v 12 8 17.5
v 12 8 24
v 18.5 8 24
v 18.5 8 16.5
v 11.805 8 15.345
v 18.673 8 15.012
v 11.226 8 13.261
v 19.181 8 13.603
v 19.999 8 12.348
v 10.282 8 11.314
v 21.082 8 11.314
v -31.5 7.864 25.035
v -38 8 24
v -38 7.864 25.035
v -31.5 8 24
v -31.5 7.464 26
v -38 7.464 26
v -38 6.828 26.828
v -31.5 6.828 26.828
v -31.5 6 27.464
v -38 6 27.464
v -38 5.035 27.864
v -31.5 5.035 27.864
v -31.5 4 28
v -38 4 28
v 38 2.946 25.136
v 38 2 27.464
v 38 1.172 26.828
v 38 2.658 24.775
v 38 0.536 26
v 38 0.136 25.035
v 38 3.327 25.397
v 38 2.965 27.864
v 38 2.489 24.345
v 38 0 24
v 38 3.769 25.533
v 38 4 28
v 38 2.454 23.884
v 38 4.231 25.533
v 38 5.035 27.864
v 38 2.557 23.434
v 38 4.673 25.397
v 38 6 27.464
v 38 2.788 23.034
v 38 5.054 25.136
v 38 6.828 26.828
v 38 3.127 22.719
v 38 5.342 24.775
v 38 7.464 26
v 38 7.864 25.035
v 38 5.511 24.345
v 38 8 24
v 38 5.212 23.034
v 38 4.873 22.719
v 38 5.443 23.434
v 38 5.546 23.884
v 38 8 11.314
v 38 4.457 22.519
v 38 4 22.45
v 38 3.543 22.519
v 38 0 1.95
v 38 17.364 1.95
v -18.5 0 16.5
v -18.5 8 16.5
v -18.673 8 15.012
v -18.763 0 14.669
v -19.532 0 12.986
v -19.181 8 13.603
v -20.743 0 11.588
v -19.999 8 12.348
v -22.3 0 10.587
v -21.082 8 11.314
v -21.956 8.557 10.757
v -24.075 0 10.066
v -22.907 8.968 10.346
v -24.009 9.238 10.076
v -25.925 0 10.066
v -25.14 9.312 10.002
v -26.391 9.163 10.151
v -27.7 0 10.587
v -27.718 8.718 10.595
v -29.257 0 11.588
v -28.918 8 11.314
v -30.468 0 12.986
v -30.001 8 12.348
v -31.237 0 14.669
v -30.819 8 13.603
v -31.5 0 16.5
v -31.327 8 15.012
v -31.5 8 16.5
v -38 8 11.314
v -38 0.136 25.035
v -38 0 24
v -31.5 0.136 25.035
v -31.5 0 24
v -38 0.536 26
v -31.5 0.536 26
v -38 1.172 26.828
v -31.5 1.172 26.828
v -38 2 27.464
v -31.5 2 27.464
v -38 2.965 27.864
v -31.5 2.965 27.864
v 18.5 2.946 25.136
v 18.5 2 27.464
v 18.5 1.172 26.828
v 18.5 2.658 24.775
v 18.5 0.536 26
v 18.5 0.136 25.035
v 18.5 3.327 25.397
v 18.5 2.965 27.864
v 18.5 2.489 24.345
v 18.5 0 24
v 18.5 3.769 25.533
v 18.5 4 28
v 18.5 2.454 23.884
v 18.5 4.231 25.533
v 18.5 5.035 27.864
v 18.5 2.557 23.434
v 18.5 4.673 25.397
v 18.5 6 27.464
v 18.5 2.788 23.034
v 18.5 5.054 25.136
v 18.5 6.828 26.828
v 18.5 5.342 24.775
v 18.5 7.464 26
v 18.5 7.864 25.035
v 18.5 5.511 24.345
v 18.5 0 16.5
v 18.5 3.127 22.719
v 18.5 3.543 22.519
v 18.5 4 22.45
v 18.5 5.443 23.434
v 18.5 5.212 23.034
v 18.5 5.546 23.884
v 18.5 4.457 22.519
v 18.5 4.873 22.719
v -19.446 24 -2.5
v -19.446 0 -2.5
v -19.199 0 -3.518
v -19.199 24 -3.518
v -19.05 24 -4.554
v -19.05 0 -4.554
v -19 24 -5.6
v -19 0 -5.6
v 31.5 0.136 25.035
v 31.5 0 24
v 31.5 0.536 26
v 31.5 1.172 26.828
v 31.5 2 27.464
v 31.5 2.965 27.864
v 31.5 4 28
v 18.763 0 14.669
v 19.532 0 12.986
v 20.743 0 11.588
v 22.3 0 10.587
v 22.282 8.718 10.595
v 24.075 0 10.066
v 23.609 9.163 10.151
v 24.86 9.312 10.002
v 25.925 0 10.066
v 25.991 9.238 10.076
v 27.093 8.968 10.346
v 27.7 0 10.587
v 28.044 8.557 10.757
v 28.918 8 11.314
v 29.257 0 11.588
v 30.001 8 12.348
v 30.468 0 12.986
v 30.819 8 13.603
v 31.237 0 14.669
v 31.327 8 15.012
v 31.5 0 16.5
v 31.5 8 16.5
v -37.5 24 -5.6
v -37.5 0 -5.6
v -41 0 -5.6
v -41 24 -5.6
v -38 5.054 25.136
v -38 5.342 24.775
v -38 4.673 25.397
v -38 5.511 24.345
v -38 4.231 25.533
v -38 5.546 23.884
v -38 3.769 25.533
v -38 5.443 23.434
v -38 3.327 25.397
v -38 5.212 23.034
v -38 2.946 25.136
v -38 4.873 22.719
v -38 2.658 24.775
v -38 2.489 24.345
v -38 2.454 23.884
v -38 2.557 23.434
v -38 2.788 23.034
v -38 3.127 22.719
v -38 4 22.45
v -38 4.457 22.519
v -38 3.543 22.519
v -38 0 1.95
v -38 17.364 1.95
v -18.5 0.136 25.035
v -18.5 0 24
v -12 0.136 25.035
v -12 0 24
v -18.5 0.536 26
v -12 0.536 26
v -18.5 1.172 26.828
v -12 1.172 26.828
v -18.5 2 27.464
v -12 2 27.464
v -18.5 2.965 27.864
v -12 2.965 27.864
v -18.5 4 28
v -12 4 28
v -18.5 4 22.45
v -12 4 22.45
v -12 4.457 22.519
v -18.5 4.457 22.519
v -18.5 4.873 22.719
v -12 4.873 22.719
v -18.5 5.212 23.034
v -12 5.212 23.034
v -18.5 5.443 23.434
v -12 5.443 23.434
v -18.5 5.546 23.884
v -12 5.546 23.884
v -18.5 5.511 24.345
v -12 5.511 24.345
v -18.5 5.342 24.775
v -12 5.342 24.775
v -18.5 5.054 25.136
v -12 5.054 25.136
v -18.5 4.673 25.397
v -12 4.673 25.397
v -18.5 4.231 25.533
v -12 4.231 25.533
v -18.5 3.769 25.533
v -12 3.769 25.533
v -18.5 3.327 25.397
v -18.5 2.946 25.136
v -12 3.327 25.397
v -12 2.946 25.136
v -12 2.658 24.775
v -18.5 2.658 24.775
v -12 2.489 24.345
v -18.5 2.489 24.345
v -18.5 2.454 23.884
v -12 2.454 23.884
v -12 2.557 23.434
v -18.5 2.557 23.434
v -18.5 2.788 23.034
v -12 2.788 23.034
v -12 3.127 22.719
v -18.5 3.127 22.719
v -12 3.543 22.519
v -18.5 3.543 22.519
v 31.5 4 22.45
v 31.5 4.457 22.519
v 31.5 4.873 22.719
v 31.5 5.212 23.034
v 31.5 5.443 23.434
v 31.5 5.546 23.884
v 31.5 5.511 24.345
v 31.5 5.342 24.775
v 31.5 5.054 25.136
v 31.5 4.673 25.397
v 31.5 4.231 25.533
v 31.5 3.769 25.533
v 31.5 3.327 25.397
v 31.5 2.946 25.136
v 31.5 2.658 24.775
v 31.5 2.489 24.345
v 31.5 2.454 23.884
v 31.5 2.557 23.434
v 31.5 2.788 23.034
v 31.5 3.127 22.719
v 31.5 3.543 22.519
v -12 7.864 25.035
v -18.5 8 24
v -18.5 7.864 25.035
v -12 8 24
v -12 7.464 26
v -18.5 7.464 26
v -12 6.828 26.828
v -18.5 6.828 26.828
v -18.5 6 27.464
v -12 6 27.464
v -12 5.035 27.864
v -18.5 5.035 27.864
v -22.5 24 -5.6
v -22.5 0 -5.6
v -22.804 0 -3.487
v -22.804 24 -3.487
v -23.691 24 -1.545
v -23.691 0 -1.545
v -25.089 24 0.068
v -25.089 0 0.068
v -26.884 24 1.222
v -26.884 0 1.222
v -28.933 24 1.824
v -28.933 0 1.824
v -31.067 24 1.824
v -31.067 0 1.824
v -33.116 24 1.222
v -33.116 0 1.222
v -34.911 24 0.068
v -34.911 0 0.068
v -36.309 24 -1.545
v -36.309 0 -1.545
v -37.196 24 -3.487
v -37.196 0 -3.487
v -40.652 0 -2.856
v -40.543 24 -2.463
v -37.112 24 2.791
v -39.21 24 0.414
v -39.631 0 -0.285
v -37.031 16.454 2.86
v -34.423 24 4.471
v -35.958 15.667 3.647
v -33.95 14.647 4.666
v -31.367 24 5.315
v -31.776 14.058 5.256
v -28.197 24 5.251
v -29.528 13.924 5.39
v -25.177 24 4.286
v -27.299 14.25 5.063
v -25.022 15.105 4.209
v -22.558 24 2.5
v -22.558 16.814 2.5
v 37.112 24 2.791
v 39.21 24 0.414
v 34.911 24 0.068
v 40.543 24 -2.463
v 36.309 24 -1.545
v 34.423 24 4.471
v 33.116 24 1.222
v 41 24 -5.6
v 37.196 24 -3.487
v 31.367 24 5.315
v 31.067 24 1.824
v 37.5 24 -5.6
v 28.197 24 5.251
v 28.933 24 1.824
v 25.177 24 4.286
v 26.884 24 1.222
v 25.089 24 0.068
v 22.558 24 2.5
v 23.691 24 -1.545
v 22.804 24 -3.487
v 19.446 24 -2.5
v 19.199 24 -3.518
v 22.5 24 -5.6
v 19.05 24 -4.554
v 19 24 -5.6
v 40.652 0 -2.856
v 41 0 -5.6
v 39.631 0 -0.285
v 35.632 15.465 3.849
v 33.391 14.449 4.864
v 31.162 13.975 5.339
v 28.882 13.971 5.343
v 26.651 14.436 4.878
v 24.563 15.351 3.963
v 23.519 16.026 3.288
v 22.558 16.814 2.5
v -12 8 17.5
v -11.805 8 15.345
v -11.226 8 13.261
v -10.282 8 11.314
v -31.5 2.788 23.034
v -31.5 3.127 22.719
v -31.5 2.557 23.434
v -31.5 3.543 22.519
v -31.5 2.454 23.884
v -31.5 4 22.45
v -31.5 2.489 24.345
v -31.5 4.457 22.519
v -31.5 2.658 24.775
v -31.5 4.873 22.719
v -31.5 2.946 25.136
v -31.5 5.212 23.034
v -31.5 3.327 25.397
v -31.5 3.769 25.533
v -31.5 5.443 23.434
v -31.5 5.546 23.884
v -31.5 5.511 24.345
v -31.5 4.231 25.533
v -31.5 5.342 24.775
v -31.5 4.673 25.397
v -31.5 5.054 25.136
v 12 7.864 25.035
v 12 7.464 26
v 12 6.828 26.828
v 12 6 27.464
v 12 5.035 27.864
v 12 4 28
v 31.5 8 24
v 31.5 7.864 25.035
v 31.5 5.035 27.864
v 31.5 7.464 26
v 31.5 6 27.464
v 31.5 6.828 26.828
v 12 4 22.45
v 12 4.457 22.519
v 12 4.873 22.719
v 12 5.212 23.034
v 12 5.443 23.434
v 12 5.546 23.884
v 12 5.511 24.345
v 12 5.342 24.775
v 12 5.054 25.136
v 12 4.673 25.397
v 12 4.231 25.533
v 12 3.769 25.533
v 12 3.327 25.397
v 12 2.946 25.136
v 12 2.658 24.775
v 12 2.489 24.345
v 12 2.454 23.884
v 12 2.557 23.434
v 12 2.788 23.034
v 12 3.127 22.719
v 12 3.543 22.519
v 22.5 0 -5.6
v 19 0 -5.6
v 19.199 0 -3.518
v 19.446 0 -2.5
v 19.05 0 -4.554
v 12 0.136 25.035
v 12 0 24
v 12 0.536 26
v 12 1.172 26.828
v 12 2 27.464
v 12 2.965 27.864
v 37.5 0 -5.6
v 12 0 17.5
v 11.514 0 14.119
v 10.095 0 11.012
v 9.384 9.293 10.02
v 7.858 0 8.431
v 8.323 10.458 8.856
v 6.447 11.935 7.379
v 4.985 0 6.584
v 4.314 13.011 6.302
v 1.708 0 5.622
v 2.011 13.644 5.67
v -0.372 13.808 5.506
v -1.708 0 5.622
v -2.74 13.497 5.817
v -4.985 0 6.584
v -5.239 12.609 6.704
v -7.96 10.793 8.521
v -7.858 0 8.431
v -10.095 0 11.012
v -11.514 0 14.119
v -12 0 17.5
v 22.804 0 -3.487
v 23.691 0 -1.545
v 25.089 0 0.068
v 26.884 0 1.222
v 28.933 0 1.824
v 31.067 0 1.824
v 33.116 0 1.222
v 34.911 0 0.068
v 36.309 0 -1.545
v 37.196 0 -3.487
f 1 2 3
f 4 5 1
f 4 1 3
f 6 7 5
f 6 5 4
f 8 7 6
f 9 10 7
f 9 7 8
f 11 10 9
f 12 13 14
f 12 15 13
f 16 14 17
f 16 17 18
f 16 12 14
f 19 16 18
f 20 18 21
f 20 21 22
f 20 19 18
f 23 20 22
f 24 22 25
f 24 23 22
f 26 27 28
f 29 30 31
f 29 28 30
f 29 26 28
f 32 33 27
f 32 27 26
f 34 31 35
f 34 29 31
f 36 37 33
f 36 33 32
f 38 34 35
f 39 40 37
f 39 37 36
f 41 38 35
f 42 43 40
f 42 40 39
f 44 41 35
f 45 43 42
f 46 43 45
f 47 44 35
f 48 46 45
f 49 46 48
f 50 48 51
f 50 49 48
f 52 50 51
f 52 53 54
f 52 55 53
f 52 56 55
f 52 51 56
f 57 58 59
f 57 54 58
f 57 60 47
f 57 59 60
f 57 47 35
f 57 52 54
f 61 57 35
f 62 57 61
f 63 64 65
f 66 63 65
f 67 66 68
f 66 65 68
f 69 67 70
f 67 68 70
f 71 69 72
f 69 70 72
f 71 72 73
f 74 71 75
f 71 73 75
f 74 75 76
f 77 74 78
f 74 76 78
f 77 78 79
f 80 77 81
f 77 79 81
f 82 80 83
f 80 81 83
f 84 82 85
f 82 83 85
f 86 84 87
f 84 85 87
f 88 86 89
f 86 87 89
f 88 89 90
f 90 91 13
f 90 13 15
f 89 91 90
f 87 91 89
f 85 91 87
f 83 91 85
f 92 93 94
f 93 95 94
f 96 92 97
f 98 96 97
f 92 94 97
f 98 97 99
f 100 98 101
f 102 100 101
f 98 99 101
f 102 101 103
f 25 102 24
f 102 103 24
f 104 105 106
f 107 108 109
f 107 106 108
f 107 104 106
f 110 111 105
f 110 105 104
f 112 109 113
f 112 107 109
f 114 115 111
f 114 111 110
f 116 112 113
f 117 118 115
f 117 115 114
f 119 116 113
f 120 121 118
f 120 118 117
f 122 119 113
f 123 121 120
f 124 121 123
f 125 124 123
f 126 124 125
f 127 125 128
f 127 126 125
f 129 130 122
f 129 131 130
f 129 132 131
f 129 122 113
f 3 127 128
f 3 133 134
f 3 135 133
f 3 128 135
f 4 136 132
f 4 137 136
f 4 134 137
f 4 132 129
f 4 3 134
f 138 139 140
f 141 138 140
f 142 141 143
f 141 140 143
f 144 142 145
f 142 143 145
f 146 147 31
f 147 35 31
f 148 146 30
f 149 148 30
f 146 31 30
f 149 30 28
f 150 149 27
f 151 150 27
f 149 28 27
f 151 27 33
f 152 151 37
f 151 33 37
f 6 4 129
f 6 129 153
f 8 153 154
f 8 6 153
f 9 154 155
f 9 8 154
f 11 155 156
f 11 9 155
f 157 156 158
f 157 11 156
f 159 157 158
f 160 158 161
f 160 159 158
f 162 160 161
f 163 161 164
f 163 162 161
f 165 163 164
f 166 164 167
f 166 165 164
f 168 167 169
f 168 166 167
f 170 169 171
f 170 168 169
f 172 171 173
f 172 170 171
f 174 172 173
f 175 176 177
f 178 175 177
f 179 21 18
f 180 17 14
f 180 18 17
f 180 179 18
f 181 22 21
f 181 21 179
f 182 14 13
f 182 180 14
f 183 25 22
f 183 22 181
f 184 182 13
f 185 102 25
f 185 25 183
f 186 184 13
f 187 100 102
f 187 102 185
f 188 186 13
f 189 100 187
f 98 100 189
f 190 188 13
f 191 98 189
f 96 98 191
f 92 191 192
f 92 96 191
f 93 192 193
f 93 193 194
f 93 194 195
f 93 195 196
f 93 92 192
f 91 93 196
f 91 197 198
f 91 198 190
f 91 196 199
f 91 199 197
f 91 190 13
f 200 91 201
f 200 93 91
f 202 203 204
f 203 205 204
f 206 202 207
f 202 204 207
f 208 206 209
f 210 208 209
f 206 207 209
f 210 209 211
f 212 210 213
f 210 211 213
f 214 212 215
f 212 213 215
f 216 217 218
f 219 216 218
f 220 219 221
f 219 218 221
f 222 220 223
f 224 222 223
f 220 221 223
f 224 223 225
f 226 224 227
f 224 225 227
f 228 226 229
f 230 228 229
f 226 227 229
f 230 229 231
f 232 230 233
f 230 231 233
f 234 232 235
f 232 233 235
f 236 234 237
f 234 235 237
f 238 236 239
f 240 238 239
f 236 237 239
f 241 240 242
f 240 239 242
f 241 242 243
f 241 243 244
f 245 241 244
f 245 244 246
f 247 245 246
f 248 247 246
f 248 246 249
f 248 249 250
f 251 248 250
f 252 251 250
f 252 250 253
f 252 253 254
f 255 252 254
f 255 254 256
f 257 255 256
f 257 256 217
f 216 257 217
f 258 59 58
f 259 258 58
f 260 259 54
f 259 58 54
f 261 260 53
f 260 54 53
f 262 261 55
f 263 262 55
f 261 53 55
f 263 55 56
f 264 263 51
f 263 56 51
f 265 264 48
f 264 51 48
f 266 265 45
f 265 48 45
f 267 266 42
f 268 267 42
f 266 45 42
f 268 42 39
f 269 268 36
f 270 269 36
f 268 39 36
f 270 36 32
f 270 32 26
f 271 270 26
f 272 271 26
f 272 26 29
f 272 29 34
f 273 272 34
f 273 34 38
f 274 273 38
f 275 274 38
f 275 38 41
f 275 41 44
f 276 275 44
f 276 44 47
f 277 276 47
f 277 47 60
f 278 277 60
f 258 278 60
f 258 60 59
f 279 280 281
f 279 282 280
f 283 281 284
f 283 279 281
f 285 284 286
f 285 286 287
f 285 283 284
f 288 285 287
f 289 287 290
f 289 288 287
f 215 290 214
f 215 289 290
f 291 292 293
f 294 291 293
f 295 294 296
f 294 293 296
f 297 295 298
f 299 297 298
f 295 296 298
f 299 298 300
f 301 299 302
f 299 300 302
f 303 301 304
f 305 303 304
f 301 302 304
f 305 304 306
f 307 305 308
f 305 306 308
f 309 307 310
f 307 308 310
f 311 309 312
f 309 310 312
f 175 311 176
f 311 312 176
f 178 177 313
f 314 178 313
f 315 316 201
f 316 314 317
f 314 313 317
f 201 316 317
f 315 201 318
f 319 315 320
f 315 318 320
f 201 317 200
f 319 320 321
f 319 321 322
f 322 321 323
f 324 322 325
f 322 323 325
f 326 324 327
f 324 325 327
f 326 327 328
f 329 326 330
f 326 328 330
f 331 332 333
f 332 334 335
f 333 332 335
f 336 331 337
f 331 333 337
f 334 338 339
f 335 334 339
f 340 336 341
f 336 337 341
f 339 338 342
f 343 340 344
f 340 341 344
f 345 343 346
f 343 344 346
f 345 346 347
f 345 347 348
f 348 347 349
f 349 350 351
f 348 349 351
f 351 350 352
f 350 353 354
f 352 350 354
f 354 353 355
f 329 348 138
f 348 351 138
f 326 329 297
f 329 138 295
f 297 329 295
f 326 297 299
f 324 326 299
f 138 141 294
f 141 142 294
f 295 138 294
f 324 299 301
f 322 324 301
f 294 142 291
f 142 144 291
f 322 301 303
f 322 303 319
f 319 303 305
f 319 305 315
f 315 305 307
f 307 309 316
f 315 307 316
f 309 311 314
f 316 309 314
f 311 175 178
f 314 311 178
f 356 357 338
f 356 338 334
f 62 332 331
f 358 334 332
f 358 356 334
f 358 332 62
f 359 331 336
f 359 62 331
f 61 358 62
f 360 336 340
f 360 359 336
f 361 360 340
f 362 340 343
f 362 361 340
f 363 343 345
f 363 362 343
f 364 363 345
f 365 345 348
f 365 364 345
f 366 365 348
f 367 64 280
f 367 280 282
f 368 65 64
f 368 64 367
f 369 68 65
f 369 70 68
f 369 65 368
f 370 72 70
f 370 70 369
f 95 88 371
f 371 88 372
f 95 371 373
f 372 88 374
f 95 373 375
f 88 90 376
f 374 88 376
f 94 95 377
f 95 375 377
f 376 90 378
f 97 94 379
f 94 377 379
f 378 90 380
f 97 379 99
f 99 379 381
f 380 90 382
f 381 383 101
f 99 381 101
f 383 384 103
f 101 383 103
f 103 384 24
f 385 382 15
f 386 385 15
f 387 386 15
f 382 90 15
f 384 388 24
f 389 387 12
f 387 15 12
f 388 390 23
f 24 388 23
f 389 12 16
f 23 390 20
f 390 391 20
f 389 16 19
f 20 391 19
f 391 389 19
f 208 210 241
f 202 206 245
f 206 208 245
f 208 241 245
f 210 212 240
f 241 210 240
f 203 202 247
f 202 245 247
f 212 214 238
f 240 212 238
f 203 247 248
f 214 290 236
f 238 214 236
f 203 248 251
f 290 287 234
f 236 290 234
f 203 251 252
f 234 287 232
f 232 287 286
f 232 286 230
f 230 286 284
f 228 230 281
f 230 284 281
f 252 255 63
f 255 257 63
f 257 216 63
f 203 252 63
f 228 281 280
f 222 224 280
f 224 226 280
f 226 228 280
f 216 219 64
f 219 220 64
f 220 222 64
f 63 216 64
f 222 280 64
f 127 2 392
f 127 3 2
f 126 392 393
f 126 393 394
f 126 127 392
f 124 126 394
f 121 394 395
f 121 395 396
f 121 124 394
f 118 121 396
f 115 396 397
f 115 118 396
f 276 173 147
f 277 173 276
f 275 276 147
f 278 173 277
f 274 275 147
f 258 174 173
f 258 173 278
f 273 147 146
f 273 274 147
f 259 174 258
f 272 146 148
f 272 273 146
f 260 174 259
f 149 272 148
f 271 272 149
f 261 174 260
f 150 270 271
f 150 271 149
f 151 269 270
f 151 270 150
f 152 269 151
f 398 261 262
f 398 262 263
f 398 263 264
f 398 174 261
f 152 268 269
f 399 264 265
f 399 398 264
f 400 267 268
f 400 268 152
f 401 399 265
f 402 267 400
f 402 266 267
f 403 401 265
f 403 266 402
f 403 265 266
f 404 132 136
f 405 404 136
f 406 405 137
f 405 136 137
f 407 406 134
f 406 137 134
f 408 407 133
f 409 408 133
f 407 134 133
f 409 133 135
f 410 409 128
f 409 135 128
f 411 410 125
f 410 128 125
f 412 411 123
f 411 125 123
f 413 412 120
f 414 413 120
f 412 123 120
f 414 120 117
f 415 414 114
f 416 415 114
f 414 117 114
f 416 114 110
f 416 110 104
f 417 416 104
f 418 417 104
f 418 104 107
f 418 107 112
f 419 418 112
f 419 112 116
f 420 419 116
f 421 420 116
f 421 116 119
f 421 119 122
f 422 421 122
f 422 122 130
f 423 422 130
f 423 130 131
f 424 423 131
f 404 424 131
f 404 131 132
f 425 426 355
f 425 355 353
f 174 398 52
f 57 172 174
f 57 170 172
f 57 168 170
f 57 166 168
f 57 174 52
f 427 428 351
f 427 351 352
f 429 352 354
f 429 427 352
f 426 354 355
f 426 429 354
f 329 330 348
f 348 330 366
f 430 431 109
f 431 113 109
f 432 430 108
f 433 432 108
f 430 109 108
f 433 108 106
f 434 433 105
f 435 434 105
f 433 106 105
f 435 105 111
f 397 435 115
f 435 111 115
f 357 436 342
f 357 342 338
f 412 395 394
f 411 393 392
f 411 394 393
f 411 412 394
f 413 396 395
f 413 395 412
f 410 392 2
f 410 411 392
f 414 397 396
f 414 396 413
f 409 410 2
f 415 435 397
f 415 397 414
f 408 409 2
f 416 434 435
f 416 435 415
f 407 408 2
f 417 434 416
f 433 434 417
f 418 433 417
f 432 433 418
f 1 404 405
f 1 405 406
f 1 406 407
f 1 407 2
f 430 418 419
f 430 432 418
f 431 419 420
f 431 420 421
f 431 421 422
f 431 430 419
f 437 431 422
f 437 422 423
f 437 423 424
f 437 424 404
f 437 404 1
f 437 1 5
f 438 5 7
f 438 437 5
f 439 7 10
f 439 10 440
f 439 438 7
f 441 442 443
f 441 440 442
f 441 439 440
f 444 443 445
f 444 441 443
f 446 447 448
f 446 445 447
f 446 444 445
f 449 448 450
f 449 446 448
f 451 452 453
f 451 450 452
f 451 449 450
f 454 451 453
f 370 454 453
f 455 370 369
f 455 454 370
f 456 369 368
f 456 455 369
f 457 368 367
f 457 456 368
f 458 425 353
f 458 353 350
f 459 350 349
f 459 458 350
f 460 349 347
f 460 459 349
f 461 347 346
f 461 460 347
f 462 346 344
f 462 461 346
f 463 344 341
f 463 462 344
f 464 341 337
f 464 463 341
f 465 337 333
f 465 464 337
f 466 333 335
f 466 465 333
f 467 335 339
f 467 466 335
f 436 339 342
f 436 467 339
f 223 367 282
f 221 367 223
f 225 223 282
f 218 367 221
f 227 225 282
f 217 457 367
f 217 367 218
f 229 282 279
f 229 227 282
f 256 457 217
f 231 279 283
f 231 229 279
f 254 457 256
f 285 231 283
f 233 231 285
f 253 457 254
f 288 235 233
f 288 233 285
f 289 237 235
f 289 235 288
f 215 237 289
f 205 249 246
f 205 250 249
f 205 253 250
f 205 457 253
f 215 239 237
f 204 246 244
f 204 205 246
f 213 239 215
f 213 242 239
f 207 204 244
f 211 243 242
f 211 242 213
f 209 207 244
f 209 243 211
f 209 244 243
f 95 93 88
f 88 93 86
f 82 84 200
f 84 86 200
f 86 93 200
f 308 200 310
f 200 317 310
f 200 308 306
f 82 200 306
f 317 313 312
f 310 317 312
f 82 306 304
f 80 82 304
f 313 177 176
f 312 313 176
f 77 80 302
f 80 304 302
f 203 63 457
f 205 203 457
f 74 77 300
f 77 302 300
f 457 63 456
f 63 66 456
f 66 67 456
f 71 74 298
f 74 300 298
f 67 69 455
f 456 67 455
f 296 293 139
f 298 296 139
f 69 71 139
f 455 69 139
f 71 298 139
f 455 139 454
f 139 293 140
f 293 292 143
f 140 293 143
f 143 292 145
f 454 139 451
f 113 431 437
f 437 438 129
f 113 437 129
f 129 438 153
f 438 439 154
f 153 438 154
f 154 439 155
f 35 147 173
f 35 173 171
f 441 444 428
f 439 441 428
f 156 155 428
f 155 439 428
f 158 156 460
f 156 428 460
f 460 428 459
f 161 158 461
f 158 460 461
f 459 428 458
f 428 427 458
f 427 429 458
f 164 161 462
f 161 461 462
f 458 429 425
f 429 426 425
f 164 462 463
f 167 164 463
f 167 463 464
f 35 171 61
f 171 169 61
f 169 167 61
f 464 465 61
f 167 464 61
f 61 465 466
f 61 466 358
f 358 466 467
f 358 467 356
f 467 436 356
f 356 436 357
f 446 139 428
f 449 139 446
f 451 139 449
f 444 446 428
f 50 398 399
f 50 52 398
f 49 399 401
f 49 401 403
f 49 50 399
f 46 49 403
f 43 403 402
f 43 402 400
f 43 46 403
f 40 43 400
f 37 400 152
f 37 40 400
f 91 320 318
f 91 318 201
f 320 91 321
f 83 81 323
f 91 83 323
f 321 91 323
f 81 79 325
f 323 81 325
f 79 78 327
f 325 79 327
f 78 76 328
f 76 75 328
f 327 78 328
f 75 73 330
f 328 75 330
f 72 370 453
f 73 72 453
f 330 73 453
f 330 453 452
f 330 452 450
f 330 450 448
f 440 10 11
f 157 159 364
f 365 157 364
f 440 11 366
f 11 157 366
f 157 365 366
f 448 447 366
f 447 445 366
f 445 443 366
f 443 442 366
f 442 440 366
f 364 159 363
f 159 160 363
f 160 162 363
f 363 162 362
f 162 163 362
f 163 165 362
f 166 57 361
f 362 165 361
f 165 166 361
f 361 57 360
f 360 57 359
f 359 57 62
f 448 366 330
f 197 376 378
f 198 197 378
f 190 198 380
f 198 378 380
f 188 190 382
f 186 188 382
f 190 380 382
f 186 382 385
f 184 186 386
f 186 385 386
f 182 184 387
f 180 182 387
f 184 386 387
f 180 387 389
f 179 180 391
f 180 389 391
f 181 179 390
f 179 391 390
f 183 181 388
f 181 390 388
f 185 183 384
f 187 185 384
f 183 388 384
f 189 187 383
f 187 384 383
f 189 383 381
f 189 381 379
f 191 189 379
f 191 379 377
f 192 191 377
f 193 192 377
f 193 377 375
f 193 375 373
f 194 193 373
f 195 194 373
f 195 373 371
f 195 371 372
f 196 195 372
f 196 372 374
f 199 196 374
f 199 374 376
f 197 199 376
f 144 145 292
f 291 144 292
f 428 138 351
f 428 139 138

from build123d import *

# Parameters (mm, degrees)
SKETCH1_W                       = 50
SKETCH1_H                       = 5
BOSS_EXTRUDE1_DEPTH             = 24
SKETCH5_W                       = 76
SKETCH5_H                       = 20
BOSS_EXTRUDE3_DEPTH             = 8
BOSS_EXTRUDE4_REACH             = 54.953
BOSS_EXTRUDE4_DIRECTION_2_REACH = 54.953
CUT_EXTRUDE4_DEPTH              = 50.839743178
FILLET1_R                       = 4
SKETCH8_R                       = 1.55
CUT_EXTRUDE5_DEPTH              = 85.474848328
BOSS_EXTRUDE2_REACH             = 54.953
SKETCH4_R                       = 7.5
CUT_EXTRUDE3_DEPTH              = 56.145262716


with BuildPart() as part:
    # Sketch1 → Boss-Extrude1 (new body)
    with BuildSketch(Plane(origin=(0, 0, 0), x_dir=(1, 0, 0), z_dir=(0, 1, 0))):
        Rectangle(SKETCH1_W, SKETCH1_H)
    extrude(amount=BOSS_EXTRUDE1_DEPTH)


with BuildPart() as body_2:
    # Sketch5 → Boss-Extrude3 (new body)
    with BuildSketch(Plane(origin=(0, 0, 0), x_dir=(1, 0, 0), z_dir=(0, 1, 0))):
        with Locations((0, -18)):
            Rectangle(SKETCH5_W, SKETCH5_H)
    extrude(amount=BOSS_EXTRUDE3_DEPTH)

    # Boss-Extrude4: up to this face of the body (flat: up to its plane)
    boss_extrude4_end = Plane(body_2.part.faces().sort_by_distance((38, 4, 18))[0])
    # Sketch6 → Boss-Extrude4 (add, up to the picked face)
    with BuildSketch(Plane(origin=(0, 0, 0), x_dir=(0, 0, -1), z_dir=(1, 0, 0)), mode=Mode.PRIVATE) as boss_extrude4_sk1:
        Polygon((-11.313708499, 8), (0, 19.313708499), (2.5, 19.313708499), (2.5, 0), (-11.313708499, 0), align=None)
    boss_extrude4_tool1 = split(extrude(boss_extrude4_sk1.sketch, amount=BOSS_EXTRUDE4_REACH, mode=Mode.PRIVATE), bisect_by=boss_extrude4_end, keep=Keep.BOTH, mode=Mode.PRIVATE)

    add(part.part)  # Boss-Extrude4 merges part
    add(boss_extrude4_tool1.solids().sort_by(Axis((0, 7.799404, 3.417281), (1, 0, 0)))[0])

    # Boss-Extrude4 direction 2: up to this face of the body (flat: up to its plane)
    boss_extrude4_direction_2_end = Plane(body_2.part.faces().sort_by_distance((-38, 4, 18))[0])
    # Sketch6 → Boss-Extrude4 direction 2 (add, up to the picked face)
    with BuildSketch(Plane(origin=(0, 0, 0), x_dir=(0, 0, -1), z_dir=(1, 0, 0)), mode=Mode.PRIVATE) as boss_extrude4_direction_2_sk1:
        Polygon((-11.313708499, 8), (0, 19.313708499), (2.5, 19.313708499), (2.5, 0), (-11.313708499, 0), align=None)
    boss_extrude4_direction_2_tool1 = split(extrude(boss_extrude4_direction_2_sk1.sketch, amount=-BOSS_EXTRUDE4_DIRECTION_2_REACH, mode=Mode.PRIVATE), bisect_by=boss_extrude4_direction_2_end, keep=Keep.BOTH, mode=Mode.PRIVATE)
    add(boss_extrude4_direction_2_tool1.solids().sort_by(Axis((0, 7.799404, 3.417281), (-1, 0, 0)))[0])

    # Sketch7 → Cut-Extrude4 (cut, symmetric)
    with BuildSketch(Plane(origin=(0, 8, 0), x_dir=(1, 0, 0), z_dir=(0, 1, 0))):
        with BuildLine():
            Line((-12, -17.5), (-12, -28))
            Line((-12, -28), (12, -28))
            Line((12, -28), (12, -17.5))
            ThreePointArc((12, -17.5), (0, -5.5), (-12, -17.5))
        make_face()
        with BuildLine():
            Line((-31.5, -16.5), (-31.5, -28))
            Line((-31.5, -28), (-18.5, -28))
            Line((-18.5, -28), (-18.5, -16.5))
            ThreePointArc((-18.5, -16.5), (-25, -10), (-31.5, -16.5))
        make_face()
    cut_extrude4 = extrude(amount=CUT_EXTRUDE4_DEPTH, both=True, mode=Mode.SUBTRACT)

    # Mirror2: Cut-Extrude4 across plane
    add(cut_extrude4.mirror(Plane(origin=(0, 0, 0), x_dir=(0, 0, 1), z_dir=(1, 0, 0))), mode=Mode.SUBTRACT)

    # Fillet1
    fillet1_edges = [body_2.edges().sort_by_distance(p)[0] for p in [
        (-34.75, 0, 28),
        (-34.75, 8, 28),
        (34.75, 0, 28),
        (34.75, 8, 28),
        (15.25, 8, 28),
        (15.25, 0, 28),
        (-15.25, 0, 28),
        (-15.25, 8, 28),
    ]]
    fillet(fillet1_edges, radius=FILLET1_R - 0.0001)  # a hair under: the kernel refuses the full size

    # Sketch8 → Cut-Extrude5 (cut, through all)
    with BuildSketch(Plane(origin=(38, 0, 0), x_dir=(0, 0, -1), z_dir=(1, 0, 0))):
        with Locations((-24, 4)):
            Circle(SKETCH8_R)
    extrude(amount=-CUT_EXTRUDE5_DEPTH, mode=Mode.SUBTRACT)

    # Boss-Extrude2: up to this face of the body (flat: up to its plane)
    boss_extrude2_end = Plane(body_2.part.faces().sort_by_distance((0, 24, 0))[0])
    # Sketch2 → Boss-Extrude2 (add, up to the picked face)
    with BuildSketch(Plane(origin=(0, 0, 0), x_dir=(1, 0, 0), z_dir=(0, 1, 0)), mode=Mode.PRIVATE) as boss_extrude2_sk1:
        with BuildLine():
            Line((19, 5.6), (41, 5.6))
            ThreePointArc((41, 5.6), (30, -5.4), (19, 5.6))
        make_face()
    boss_extrude2_tool1 = split(extrude(boss_extrude2_sk1.sketch, amount=BOSS_EXTRUDE2_REACH, mode=Mode.PRIVATE), bisect_by=boss_extrude2_end, keep=Keep.BOTH, mode=Mode.PRIVATE)
    boss_extrude2 = boss_extrude2_tool1.solids().sort_by(Axis((30, 0, -0.931455), (0, 1, 0)))[0]
    add(boss_extrude2)

    # Sketch4 → Cut-Extrude3 (cut, through all)
    with BuildSketch(Plane(origin=(0, 0, 0), x_dir=(1, 0, 0), z_dir=(0, 1, 0))):
        with Locations((30, 5.6)):
            Circle(SKETCH4_R)
    cut_extrude3 = extrude(amount=CUT_EXTRUDE3_DEPTH, mode=Mode.SUBTRACT)

    # Mirror1: Boss-Extrude2, Cut-Extrude3 across plane
    add(boss_extrude2.mirror(Plane(origin=(0, 0, 0), x_dir=(0, 0, 1), z_dir=(1, 0, 0))))
    add(cut_extrude3.mirror(Plane(origin=(0, 0, 0), x_dir=(0, 0, 1), z_dir=(1, 0, 0))), mode=Mode.SUBTRACT)


solid = body_2.part
